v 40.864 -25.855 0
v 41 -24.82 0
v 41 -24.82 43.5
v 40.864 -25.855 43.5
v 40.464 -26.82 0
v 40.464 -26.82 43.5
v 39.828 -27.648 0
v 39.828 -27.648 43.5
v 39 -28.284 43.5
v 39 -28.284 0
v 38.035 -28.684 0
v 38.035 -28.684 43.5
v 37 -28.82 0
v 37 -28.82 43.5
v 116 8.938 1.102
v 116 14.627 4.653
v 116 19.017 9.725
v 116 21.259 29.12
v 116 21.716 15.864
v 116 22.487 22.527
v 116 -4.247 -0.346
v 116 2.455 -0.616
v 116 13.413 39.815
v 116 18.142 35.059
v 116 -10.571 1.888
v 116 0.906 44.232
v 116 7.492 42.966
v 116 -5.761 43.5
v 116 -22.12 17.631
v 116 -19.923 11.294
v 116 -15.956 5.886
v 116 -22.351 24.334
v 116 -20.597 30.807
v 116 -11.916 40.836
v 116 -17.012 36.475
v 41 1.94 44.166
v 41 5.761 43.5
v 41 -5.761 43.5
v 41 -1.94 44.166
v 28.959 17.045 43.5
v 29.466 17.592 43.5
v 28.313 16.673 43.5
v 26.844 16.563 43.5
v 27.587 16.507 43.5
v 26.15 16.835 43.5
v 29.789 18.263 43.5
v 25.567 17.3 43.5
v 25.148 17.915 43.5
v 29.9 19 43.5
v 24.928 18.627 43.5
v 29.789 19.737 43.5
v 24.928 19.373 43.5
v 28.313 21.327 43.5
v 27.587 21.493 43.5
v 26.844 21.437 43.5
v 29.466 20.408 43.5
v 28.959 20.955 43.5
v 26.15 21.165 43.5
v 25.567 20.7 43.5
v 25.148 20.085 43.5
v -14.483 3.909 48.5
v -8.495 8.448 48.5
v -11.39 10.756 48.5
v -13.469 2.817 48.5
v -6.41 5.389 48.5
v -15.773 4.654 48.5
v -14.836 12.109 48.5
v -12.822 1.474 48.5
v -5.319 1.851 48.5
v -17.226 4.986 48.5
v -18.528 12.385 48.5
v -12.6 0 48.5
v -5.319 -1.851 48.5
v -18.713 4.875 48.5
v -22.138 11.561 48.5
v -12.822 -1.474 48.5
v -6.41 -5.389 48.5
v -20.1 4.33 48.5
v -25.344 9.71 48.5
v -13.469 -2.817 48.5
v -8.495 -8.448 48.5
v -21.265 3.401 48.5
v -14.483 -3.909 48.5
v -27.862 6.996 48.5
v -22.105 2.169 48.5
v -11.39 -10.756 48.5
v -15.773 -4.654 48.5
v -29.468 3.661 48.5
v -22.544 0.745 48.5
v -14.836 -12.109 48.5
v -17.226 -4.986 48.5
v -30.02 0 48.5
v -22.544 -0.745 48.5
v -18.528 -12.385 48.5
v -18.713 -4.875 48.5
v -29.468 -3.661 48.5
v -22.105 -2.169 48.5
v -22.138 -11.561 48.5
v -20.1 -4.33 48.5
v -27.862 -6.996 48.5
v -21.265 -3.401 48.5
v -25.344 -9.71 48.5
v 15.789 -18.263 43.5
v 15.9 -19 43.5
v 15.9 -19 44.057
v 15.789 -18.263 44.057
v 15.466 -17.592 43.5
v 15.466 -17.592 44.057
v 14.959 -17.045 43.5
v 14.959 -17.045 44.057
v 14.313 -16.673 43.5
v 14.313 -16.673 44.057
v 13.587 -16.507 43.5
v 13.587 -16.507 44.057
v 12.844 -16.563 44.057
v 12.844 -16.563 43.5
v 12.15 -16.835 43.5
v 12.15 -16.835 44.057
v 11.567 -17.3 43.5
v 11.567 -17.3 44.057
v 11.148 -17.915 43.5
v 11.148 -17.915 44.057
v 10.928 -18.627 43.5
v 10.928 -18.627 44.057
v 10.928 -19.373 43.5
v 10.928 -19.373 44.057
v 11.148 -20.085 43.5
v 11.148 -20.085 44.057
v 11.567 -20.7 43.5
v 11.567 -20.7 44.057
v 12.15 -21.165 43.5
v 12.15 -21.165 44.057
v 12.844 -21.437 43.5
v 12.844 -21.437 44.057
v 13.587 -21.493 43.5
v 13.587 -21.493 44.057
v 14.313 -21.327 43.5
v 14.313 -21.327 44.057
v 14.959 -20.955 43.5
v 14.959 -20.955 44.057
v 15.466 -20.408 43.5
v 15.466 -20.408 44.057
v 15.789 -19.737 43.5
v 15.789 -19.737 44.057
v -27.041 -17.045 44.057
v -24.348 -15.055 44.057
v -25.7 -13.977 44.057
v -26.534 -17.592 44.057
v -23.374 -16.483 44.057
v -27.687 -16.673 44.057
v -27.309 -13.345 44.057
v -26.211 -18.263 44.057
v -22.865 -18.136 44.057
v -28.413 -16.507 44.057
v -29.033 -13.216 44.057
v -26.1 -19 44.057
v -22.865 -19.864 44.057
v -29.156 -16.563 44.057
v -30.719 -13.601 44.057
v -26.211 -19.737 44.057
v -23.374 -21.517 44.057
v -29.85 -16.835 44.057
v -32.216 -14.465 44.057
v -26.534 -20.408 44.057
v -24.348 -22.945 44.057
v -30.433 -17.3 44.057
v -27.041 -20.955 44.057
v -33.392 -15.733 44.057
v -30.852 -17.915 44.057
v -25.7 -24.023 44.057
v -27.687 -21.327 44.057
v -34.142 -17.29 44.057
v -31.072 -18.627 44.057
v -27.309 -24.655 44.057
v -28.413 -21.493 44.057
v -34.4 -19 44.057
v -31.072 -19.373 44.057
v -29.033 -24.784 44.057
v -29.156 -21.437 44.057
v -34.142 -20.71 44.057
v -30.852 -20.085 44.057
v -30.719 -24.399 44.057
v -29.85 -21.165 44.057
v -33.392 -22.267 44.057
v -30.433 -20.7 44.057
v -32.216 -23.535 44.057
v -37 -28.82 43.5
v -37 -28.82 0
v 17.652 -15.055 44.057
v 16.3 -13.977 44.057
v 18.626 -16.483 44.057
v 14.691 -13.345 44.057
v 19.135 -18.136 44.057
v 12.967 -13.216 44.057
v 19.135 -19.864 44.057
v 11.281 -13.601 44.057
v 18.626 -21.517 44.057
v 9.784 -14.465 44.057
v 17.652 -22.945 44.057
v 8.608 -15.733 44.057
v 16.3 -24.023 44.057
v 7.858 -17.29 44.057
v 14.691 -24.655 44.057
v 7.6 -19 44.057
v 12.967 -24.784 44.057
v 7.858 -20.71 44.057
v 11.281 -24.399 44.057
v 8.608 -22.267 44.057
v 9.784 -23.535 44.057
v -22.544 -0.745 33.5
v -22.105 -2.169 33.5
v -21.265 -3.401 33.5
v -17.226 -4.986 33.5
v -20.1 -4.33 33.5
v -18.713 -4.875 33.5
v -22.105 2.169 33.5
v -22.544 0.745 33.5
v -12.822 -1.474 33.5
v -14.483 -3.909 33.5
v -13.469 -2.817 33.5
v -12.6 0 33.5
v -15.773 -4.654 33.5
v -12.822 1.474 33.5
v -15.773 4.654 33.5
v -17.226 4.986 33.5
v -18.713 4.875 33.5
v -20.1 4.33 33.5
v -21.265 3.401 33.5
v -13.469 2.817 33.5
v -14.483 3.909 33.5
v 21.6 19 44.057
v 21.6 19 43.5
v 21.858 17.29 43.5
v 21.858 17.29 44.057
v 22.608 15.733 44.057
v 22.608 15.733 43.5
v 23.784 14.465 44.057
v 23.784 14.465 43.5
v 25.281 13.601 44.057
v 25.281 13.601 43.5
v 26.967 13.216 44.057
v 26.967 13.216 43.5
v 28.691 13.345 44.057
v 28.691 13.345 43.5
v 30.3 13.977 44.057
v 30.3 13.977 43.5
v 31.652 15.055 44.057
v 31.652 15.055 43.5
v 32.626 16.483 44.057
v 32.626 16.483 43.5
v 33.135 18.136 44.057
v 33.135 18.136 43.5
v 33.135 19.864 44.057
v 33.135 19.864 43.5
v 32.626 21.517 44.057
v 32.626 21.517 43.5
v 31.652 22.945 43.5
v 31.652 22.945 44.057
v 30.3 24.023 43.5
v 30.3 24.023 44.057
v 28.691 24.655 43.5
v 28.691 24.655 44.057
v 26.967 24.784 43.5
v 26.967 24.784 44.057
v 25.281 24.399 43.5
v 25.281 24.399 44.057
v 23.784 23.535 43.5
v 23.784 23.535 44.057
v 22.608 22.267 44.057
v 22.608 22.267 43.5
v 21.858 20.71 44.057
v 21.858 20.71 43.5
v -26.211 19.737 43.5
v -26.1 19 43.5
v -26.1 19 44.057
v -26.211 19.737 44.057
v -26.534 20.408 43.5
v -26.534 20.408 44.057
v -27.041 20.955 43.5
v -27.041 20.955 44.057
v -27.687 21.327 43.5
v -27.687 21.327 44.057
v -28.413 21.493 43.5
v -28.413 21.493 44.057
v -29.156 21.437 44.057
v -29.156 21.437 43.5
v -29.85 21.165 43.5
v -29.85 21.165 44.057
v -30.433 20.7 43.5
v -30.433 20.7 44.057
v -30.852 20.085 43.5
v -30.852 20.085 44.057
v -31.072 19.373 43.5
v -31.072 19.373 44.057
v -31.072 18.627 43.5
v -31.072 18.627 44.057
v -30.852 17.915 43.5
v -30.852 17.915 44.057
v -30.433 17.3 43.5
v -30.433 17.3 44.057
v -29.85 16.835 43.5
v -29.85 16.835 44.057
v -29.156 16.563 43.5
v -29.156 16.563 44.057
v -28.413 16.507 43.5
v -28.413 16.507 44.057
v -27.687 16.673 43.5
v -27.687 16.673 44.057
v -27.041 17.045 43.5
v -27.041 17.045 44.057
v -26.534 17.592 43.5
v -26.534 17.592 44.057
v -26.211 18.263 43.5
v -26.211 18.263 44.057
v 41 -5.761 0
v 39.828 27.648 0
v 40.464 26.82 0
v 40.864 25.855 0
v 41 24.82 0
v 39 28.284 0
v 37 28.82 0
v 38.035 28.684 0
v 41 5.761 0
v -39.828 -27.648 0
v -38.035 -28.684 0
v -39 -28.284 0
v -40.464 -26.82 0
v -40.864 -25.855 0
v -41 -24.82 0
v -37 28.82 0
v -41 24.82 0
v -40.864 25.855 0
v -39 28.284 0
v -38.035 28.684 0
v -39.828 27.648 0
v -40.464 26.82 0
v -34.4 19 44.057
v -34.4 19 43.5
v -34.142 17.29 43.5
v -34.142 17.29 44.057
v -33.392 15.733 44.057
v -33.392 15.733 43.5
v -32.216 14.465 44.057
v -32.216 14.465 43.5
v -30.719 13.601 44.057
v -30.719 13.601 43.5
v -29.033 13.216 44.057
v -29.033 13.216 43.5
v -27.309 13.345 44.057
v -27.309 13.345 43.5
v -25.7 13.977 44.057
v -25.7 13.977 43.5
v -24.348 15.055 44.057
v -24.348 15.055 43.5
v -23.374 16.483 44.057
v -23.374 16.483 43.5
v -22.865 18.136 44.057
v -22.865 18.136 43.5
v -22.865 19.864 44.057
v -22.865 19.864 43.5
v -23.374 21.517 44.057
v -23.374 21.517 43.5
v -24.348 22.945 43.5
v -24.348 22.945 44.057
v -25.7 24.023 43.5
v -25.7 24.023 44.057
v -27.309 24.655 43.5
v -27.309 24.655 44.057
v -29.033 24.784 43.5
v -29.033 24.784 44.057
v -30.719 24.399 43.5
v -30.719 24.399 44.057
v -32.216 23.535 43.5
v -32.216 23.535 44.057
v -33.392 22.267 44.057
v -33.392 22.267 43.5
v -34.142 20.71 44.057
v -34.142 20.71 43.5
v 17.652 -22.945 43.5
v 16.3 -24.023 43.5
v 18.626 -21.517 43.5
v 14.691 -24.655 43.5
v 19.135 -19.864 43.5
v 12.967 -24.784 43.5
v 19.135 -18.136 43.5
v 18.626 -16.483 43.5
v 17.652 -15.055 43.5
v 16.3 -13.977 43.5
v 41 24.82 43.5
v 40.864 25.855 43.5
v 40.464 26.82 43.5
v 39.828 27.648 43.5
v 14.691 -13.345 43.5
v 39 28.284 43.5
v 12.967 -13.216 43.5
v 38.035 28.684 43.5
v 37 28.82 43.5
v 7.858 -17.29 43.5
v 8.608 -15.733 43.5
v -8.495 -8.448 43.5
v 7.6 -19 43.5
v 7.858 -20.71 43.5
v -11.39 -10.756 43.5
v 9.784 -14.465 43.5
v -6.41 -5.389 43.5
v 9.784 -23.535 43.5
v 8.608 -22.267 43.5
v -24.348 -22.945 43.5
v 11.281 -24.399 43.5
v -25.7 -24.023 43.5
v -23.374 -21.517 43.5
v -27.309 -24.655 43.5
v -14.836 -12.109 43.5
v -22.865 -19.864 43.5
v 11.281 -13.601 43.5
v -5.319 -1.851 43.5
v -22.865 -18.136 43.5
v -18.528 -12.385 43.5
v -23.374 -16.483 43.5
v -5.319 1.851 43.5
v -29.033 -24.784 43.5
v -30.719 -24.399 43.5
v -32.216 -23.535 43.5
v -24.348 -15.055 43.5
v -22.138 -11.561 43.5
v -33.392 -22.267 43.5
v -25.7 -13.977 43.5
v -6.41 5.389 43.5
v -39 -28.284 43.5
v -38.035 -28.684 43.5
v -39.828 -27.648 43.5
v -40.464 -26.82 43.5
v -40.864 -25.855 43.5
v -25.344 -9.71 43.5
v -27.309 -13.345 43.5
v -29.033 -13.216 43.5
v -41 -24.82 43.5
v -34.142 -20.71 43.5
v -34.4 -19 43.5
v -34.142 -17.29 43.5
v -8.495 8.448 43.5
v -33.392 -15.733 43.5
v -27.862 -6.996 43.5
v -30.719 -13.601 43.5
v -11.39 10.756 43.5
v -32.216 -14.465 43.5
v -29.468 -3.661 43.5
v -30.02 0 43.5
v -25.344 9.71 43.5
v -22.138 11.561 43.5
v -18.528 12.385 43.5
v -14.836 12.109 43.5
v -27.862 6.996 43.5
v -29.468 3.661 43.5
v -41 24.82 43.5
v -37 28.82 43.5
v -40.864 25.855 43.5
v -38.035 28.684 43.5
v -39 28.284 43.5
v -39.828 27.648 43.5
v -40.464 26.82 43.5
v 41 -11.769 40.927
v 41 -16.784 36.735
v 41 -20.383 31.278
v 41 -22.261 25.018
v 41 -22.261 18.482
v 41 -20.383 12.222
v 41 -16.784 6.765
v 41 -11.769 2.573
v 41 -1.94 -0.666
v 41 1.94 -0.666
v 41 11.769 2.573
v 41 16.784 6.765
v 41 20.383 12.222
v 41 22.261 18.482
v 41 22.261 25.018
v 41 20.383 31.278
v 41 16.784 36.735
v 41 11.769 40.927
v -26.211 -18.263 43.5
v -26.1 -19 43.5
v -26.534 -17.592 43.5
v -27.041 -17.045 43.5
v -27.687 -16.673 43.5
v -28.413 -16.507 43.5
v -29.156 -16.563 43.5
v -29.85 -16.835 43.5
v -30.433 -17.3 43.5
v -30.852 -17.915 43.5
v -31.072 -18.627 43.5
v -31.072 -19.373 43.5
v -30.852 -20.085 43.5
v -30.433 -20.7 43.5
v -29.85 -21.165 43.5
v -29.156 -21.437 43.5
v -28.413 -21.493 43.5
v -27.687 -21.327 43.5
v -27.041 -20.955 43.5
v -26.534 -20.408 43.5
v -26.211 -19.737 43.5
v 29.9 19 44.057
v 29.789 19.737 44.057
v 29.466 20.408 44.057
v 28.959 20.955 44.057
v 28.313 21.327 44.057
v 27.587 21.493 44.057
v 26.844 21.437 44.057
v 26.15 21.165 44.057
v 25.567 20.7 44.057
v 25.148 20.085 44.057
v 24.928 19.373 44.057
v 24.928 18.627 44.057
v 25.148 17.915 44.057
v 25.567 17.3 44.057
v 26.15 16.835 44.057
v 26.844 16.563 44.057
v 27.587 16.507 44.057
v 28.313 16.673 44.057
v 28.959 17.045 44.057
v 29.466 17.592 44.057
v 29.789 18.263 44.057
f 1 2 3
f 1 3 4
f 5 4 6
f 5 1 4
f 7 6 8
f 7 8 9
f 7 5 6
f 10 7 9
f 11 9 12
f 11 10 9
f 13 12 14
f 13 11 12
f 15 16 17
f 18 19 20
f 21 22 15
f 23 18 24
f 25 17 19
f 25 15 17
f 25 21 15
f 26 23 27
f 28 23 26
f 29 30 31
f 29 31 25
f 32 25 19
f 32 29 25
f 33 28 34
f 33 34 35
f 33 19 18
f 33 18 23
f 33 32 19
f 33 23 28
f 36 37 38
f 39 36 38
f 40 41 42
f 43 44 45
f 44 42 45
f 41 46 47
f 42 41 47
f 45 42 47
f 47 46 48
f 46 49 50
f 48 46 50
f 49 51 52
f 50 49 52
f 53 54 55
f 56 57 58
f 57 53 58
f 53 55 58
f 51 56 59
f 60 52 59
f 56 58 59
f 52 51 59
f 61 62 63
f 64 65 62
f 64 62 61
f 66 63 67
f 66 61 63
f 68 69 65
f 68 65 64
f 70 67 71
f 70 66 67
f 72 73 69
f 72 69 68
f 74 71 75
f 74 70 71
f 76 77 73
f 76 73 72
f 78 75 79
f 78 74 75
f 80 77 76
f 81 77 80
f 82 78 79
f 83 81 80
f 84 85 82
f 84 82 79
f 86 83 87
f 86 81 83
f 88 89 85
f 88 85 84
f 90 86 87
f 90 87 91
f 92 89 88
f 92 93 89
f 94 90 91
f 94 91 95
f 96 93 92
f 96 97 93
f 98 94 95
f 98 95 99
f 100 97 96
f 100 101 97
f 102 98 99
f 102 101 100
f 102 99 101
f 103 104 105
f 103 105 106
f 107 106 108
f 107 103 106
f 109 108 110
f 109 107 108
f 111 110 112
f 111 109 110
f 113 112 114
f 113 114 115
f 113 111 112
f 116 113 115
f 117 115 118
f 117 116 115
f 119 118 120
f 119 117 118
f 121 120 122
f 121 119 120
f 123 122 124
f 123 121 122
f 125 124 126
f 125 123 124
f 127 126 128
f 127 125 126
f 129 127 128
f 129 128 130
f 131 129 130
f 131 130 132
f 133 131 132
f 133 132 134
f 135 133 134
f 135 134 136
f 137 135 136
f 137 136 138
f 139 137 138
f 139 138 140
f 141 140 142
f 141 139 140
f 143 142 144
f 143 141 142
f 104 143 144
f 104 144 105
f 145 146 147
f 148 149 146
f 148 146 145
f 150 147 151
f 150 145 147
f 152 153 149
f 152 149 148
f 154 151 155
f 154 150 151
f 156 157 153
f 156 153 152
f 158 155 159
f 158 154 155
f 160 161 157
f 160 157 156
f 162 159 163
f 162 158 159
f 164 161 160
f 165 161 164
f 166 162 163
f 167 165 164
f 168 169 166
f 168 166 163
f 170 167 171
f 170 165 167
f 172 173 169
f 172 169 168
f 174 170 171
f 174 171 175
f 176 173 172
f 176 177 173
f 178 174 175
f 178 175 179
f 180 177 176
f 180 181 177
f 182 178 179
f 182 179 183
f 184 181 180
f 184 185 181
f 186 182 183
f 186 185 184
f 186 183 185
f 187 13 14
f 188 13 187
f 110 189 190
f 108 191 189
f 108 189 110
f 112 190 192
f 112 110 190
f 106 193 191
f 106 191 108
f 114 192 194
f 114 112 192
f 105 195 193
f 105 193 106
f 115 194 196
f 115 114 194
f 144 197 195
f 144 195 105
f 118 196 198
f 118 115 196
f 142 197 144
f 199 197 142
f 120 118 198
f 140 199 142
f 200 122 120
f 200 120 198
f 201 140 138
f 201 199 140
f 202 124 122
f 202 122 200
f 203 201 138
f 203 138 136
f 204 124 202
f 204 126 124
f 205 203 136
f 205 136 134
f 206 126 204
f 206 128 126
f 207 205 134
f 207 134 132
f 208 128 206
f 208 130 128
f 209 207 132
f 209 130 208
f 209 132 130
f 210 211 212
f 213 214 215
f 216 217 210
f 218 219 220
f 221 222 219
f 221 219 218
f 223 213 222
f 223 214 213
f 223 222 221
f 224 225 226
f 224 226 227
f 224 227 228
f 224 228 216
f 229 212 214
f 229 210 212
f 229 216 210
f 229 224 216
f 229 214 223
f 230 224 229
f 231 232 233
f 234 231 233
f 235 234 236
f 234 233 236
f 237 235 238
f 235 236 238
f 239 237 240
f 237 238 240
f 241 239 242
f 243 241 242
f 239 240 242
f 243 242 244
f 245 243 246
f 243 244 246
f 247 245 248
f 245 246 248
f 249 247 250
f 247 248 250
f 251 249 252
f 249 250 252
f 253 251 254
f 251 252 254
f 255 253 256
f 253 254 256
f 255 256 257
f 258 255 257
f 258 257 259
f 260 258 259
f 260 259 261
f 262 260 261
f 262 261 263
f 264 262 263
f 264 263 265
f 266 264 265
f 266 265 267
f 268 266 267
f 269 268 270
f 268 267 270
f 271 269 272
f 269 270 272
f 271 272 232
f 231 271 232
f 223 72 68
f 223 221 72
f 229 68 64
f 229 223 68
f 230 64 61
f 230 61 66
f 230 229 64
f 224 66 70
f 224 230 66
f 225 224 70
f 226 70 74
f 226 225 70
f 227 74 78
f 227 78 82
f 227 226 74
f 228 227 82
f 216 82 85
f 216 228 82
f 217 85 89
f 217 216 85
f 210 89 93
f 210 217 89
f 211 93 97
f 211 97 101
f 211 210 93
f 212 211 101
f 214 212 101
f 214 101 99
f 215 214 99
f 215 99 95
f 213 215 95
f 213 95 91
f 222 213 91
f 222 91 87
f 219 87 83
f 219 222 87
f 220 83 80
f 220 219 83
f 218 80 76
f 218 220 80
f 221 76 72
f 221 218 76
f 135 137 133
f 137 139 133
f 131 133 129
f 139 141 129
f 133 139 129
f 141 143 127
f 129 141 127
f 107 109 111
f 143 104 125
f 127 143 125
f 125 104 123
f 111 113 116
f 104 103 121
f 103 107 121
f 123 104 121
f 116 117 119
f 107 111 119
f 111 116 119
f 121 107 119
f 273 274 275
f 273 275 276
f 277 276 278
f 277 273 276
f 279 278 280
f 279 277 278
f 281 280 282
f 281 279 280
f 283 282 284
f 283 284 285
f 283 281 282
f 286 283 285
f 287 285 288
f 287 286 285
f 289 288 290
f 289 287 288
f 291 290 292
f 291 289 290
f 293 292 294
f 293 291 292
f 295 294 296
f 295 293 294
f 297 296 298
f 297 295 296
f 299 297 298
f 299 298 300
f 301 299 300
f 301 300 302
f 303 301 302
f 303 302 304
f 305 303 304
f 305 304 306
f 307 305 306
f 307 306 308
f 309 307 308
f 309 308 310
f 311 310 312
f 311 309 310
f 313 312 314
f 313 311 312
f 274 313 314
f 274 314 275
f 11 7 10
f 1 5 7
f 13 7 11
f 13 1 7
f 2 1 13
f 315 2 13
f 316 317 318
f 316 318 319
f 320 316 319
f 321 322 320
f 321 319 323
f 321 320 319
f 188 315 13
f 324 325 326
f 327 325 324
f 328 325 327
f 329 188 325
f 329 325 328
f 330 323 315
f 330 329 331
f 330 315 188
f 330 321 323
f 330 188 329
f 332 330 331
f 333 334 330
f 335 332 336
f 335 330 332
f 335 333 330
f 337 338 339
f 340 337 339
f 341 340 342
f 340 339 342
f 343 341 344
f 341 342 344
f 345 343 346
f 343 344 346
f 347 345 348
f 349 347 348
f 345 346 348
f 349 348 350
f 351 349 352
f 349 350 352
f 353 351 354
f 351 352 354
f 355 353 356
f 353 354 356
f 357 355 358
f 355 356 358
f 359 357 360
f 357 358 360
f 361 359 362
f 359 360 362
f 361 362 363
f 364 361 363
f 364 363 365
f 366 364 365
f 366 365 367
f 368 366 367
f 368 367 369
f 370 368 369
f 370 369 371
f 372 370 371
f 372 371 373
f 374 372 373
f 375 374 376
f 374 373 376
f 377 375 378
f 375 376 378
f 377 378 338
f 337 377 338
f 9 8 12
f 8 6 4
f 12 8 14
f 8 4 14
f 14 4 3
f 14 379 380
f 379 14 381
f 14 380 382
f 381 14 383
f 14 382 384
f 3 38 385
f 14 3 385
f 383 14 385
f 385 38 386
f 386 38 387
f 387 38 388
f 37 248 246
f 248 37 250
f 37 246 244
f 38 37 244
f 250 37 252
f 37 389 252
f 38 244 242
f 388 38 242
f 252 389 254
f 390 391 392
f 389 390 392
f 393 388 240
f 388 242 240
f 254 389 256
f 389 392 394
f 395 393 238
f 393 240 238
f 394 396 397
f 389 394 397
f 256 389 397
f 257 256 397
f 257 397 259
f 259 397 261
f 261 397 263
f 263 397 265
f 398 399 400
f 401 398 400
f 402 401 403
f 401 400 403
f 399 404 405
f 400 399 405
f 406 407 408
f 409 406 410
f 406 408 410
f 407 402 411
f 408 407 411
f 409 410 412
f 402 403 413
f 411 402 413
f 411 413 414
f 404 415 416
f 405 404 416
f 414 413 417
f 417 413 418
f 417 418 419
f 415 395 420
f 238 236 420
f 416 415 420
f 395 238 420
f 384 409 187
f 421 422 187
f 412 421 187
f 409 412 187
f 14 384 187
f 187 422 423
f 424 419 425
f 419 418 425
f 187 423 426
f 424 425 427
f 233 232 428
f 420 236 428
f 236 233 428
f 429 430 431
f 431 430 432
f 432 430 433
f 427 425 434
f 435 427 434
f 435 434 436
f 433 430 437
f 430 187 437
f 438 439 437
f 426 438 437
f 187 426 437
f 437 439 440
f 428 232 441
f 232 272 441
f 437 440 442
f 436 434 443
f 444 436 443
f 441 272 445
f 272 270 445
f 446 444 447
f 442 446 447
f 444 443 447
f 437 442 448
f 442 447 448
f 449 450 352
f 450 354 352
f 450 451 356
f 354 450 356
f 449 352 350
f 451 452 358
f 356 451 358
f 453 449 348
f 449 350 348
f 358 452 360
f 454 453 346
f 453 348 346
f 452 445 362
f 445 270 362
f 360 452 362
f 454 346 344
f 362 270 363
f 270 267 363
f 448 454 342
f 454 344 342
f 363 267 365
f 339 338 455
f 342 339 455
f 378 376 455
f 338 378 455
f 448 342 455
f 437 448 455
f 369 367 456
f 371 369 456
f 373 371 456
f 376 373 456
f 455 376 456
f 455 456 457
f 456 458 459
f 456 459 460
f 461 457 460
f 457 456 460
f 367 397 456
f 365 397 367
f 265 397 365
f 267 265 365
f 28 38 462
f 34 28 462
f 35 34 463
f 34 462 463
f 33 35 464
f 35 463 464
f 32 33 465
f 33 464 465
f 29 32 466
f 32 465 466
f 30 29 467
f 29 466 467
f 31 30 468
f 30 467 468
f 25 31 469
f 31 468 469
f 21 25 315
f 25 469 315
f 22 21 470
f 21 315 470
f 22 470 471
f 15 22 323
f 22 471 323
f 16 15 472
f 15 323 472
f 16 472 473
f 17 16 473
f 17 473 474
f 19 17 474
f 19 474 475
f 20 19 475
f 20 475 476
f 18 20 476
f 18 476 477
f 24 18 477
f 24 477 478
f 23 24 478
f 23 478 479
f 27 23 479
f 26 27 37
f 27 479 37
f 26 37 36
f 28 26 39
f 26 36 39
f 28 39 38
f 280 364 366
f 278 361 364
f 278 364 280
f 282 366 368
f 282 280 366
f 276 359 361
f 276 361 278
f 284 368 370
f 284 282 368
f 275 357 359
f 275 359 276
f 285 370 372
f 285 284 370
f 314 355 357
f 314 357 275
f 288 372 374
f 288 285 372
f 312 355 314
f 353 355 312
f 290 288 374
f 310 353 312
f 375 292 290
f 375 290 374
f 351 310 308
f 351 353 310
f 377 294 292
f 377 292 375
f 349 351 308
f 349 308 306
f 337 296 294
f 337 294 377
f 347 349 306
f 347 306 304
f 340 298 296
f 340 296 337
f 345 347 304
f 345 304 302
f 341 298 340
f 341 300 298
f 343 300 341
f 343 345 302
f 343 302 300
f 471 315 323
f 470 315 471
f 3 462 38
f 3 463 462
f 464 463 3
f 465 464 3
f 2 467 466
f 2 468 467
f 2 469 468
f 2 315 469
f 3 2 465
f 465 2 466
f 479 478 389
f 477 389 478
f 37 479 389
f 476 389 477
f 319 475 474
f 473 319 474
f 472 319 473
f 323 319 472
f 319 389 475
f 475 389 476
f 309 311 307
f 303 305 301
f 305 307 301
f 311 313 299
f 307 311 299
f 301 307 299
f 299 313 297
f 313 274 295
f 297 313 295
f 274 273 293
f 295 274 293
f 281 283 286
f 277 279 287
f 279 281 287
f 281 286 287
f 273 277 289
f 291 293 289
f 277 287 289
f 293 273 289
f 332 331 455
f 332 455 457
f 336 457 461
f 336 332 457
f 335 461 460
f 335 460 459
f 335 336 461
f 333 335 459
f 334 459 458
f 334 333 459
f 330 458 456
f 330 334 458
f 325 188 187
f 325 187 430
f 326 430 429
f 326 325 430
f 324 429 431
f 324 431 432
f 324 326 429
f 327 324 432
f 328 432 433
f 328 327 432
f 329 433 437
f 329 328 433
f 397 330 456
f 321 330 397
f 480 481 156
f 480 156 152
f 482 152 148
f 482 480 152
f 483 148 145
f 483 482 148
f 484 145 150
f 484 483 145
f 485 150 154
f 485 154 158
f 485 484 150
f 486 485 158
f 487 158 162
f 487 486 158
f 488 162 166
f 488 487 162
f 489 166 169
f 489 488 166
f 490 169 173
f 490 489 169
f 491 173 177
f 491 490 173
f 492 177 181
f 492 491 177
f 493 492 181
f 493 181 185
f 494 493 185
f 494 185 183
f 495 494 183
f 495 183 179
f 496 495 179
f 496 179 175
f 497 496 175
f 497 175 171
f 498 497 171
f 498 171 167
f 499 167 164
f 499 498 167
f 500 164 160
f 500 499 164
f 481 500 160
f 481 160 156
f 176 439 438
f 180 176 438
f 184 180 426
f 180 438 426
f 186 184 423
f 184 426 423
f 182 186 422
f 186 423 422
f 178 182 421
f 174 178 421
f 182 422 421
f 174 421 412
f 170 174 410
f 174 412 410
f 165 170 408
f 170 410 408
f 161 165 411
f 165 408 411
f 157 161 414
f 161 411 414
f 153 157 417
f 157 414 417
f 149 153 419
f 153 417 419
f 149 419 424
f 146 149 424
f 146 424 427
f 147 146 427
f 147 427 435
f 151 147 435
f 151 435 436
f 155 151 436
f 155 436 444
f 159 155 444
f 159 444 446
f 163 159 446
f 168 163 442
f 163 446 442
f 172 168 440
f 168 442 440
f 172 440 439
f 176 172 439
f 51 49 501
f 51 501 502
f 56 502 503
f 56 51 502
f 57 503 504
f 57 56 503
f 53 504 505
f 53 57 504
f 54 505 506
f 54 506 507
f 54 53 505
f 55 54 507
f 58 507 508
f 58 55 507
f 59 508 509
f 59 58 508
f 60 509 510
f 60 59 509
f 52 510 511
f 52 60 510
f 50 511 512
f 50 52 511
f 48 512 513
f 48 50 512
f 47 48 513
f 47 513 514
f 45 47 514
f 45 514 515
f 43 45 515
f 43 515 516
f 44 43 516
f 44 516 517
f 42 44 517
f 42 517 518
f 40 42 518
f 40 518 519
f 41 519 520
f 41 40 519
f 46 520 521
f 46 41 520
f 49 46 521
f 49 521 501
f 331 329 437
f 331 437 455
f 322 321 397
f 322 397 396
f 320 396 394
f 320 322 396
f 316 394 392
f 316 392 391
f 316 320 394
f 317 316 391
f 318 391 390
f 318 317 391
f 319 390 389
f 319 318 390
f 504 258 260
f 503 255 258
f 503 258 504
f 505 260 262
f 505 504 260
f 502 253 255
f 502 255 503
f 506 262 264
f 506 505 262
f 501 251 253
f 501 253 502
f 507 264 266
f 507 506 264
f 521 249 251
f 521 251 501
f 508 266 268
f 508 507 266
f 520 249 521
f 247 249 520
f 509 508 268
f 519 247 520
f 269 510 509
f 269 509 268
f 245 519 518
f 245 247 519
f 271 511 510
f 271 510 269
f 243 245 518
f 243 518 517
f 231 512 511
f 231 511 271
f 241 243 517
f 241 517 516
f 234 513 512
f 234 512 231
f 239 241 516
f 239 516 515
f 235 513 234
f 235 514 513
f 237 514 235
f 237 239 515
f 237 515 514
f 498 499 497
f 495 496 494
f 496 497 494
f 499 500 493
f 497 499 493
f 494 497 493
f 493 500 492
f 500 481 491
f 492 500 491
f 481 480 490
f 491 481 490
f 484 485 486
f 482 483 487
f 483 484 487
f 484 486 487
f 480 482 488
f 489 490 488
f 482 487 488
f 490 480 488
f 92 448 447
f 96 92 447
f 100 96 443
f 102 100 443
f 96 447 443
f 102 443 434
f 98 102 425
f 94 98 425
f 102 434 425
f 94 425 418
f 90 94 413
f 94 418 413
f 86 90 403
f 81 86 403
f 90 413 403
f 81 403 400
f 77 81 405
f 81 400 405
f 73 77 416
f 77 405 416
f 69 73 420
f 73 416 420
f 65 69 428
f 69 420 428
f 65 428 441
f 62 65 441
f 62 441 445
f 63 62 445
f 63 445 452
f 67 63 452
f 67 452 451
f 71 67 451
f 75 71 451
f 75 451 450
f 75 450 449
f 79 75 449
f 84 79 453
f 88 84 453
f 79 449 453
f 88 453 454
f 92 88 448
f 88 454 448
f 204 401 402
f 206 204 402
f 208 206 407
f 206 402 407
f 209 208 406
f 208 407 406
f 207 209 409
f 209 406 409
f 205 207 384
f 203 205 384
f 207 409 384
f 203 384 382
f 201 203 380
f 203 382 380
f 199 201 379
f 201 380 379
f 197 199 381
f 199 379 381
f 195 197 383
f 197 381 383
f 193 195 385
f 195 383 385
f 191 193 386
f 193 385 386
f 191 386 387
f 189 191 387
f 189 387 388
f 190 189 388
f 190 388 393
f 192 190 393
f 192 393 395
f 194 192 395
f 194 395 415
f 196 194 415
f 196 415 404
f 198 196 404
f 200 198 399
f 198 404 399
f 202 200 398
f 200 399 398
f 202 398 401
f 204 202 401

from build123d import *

# Parameters (mm, degrees)
EXTRUDE_1_DEPTH     = 43.5
SKETCH_3_R          = 5.8
SKETCH_3_R_2        = 2.5
EXTRUDE_2_DEPTH     = 0.557471264
SKETCH_3_3_R        = 12.42
SKETCH_3_3_R_2      = 5
EXTRUDE_3_DEPTH     = 5
SKETCH_4_R          = 22.5
EXTRUDE_4_DEPTH     = 75
CUT_EXTRUDE_START   = -10
SKETCH_3_4_R        = 5
CUT_EXTRUDE_1_DEPTH = 10


with BuildPart() as part:
    # 스케치2 → 보스-돌출1 (new body)
    with BuildSketch(Plane.XY):
        with BuildLine():
            Line((-37, 28.82), (37, 28.82))
            ThreePointArc((37, 28.82), (39.828427125, 27.648427125), (41, 24.82))
            Line((41, 24.82), (41, -24.82))
            ThreePointArc((41, -24.82), (39.828427125, -27.648427125), (37, -28.82))
            Line((37, -28.82), (-37, -28.82))
            ThreePointArc((-37, -28.82), (-39.828427125, -27.648427125), (-41, -24.82))
            Line((-41, -24.82), (-41, 24.82))
            ThreePointArc((-41, 24.82), (-39.828427125, 27.648427125), (-37, 28.82))
        make_face()
    extrude(amount=EXTRUDE_1_DEPTH)

    # 스케치3 → 보스-돌출2 (add)
    # profile 1 of 4: a face of its own
    with BuildSketch(Plane.XY.offset(43.5)):
        with Locations((-28.6, 19)):
            Circle(SKETCH_3_R)
        with Locations((-28.6, 19)):
            Circle(SKETCH_3_R_2, mode=Mode.SUBTRACT)
    # profile 2 of 4: a face of its own
    with BuildSketch(Plane.XY.offset(43.5)):
        with Locations((-28.6, -19)):
            Circle(SKETCH_3_R)
        with Locations((-28.6, -19)):
            Circle(SKETCH_3_R_2, mode=Mode.SUBTRACT)
    # profile 3 of 4: a face of its own
    with BuildSketch(Plane.XY.offset(43.5)):
        with Locations((27.4, 19)):
            Circle(SKETCH_3_R)
        with Locations((27.4, 19)):
            Circle(SKETCH_3_R_2, mode=Mode.SUBTRACT)
    # profile 4 of 4: a face of its own
    with BuildSketch(Plane.XY.offset(43.5)):
        with Locations((13.4, -19)):
            Circle(SKETCH_3_R)
        with Locations((13.4, -19)):
            Circle(SKETCH_3_R_2, mode=Mode.SUBTRACT)
    extrude(amount=EXTRUDE_2_DEPTH)

    # 스케치3<3> → 보스-돌출3 (add)
    with BuildSketch(Plane.XY.offset(43.5)):
        with Locations((-17.6, 0)):
            Circle(SKETCH_3_3_R)
        with Locations((-17.6, 0)):
            Circle(SKETCH_3_3_R_2, mode=Mode.SUBTRACT)
    extrude(amount=EXTRUDE_3_DEPTH)

    # 스케치4 → 보스-돌출4 (add)
    with BuildSketch(Plane(origin=(41, 0, 0), x_dir=(0, 0, -1), z_dir=(1, 0, 0))):
        with Locations((-21.75, 0)):
            Circle(SKETCH_4_R)
    extrude(amount=EXTRUDE_4_DEPTH)

    # 스케치3<4> → 컷-돌출1 (cut)
    with BuildSketch(Plane.XY.offset(43.5).offset(CUT_EXTRUDE_START)):
        with Locations((-17.6, 0)):
            Circle(SKETCH_3_4_R)
    extrude(amount=CUT_EXTRUDE_1_DEPTH, mode=Mode.SUBTRACT)


solid = part.part
